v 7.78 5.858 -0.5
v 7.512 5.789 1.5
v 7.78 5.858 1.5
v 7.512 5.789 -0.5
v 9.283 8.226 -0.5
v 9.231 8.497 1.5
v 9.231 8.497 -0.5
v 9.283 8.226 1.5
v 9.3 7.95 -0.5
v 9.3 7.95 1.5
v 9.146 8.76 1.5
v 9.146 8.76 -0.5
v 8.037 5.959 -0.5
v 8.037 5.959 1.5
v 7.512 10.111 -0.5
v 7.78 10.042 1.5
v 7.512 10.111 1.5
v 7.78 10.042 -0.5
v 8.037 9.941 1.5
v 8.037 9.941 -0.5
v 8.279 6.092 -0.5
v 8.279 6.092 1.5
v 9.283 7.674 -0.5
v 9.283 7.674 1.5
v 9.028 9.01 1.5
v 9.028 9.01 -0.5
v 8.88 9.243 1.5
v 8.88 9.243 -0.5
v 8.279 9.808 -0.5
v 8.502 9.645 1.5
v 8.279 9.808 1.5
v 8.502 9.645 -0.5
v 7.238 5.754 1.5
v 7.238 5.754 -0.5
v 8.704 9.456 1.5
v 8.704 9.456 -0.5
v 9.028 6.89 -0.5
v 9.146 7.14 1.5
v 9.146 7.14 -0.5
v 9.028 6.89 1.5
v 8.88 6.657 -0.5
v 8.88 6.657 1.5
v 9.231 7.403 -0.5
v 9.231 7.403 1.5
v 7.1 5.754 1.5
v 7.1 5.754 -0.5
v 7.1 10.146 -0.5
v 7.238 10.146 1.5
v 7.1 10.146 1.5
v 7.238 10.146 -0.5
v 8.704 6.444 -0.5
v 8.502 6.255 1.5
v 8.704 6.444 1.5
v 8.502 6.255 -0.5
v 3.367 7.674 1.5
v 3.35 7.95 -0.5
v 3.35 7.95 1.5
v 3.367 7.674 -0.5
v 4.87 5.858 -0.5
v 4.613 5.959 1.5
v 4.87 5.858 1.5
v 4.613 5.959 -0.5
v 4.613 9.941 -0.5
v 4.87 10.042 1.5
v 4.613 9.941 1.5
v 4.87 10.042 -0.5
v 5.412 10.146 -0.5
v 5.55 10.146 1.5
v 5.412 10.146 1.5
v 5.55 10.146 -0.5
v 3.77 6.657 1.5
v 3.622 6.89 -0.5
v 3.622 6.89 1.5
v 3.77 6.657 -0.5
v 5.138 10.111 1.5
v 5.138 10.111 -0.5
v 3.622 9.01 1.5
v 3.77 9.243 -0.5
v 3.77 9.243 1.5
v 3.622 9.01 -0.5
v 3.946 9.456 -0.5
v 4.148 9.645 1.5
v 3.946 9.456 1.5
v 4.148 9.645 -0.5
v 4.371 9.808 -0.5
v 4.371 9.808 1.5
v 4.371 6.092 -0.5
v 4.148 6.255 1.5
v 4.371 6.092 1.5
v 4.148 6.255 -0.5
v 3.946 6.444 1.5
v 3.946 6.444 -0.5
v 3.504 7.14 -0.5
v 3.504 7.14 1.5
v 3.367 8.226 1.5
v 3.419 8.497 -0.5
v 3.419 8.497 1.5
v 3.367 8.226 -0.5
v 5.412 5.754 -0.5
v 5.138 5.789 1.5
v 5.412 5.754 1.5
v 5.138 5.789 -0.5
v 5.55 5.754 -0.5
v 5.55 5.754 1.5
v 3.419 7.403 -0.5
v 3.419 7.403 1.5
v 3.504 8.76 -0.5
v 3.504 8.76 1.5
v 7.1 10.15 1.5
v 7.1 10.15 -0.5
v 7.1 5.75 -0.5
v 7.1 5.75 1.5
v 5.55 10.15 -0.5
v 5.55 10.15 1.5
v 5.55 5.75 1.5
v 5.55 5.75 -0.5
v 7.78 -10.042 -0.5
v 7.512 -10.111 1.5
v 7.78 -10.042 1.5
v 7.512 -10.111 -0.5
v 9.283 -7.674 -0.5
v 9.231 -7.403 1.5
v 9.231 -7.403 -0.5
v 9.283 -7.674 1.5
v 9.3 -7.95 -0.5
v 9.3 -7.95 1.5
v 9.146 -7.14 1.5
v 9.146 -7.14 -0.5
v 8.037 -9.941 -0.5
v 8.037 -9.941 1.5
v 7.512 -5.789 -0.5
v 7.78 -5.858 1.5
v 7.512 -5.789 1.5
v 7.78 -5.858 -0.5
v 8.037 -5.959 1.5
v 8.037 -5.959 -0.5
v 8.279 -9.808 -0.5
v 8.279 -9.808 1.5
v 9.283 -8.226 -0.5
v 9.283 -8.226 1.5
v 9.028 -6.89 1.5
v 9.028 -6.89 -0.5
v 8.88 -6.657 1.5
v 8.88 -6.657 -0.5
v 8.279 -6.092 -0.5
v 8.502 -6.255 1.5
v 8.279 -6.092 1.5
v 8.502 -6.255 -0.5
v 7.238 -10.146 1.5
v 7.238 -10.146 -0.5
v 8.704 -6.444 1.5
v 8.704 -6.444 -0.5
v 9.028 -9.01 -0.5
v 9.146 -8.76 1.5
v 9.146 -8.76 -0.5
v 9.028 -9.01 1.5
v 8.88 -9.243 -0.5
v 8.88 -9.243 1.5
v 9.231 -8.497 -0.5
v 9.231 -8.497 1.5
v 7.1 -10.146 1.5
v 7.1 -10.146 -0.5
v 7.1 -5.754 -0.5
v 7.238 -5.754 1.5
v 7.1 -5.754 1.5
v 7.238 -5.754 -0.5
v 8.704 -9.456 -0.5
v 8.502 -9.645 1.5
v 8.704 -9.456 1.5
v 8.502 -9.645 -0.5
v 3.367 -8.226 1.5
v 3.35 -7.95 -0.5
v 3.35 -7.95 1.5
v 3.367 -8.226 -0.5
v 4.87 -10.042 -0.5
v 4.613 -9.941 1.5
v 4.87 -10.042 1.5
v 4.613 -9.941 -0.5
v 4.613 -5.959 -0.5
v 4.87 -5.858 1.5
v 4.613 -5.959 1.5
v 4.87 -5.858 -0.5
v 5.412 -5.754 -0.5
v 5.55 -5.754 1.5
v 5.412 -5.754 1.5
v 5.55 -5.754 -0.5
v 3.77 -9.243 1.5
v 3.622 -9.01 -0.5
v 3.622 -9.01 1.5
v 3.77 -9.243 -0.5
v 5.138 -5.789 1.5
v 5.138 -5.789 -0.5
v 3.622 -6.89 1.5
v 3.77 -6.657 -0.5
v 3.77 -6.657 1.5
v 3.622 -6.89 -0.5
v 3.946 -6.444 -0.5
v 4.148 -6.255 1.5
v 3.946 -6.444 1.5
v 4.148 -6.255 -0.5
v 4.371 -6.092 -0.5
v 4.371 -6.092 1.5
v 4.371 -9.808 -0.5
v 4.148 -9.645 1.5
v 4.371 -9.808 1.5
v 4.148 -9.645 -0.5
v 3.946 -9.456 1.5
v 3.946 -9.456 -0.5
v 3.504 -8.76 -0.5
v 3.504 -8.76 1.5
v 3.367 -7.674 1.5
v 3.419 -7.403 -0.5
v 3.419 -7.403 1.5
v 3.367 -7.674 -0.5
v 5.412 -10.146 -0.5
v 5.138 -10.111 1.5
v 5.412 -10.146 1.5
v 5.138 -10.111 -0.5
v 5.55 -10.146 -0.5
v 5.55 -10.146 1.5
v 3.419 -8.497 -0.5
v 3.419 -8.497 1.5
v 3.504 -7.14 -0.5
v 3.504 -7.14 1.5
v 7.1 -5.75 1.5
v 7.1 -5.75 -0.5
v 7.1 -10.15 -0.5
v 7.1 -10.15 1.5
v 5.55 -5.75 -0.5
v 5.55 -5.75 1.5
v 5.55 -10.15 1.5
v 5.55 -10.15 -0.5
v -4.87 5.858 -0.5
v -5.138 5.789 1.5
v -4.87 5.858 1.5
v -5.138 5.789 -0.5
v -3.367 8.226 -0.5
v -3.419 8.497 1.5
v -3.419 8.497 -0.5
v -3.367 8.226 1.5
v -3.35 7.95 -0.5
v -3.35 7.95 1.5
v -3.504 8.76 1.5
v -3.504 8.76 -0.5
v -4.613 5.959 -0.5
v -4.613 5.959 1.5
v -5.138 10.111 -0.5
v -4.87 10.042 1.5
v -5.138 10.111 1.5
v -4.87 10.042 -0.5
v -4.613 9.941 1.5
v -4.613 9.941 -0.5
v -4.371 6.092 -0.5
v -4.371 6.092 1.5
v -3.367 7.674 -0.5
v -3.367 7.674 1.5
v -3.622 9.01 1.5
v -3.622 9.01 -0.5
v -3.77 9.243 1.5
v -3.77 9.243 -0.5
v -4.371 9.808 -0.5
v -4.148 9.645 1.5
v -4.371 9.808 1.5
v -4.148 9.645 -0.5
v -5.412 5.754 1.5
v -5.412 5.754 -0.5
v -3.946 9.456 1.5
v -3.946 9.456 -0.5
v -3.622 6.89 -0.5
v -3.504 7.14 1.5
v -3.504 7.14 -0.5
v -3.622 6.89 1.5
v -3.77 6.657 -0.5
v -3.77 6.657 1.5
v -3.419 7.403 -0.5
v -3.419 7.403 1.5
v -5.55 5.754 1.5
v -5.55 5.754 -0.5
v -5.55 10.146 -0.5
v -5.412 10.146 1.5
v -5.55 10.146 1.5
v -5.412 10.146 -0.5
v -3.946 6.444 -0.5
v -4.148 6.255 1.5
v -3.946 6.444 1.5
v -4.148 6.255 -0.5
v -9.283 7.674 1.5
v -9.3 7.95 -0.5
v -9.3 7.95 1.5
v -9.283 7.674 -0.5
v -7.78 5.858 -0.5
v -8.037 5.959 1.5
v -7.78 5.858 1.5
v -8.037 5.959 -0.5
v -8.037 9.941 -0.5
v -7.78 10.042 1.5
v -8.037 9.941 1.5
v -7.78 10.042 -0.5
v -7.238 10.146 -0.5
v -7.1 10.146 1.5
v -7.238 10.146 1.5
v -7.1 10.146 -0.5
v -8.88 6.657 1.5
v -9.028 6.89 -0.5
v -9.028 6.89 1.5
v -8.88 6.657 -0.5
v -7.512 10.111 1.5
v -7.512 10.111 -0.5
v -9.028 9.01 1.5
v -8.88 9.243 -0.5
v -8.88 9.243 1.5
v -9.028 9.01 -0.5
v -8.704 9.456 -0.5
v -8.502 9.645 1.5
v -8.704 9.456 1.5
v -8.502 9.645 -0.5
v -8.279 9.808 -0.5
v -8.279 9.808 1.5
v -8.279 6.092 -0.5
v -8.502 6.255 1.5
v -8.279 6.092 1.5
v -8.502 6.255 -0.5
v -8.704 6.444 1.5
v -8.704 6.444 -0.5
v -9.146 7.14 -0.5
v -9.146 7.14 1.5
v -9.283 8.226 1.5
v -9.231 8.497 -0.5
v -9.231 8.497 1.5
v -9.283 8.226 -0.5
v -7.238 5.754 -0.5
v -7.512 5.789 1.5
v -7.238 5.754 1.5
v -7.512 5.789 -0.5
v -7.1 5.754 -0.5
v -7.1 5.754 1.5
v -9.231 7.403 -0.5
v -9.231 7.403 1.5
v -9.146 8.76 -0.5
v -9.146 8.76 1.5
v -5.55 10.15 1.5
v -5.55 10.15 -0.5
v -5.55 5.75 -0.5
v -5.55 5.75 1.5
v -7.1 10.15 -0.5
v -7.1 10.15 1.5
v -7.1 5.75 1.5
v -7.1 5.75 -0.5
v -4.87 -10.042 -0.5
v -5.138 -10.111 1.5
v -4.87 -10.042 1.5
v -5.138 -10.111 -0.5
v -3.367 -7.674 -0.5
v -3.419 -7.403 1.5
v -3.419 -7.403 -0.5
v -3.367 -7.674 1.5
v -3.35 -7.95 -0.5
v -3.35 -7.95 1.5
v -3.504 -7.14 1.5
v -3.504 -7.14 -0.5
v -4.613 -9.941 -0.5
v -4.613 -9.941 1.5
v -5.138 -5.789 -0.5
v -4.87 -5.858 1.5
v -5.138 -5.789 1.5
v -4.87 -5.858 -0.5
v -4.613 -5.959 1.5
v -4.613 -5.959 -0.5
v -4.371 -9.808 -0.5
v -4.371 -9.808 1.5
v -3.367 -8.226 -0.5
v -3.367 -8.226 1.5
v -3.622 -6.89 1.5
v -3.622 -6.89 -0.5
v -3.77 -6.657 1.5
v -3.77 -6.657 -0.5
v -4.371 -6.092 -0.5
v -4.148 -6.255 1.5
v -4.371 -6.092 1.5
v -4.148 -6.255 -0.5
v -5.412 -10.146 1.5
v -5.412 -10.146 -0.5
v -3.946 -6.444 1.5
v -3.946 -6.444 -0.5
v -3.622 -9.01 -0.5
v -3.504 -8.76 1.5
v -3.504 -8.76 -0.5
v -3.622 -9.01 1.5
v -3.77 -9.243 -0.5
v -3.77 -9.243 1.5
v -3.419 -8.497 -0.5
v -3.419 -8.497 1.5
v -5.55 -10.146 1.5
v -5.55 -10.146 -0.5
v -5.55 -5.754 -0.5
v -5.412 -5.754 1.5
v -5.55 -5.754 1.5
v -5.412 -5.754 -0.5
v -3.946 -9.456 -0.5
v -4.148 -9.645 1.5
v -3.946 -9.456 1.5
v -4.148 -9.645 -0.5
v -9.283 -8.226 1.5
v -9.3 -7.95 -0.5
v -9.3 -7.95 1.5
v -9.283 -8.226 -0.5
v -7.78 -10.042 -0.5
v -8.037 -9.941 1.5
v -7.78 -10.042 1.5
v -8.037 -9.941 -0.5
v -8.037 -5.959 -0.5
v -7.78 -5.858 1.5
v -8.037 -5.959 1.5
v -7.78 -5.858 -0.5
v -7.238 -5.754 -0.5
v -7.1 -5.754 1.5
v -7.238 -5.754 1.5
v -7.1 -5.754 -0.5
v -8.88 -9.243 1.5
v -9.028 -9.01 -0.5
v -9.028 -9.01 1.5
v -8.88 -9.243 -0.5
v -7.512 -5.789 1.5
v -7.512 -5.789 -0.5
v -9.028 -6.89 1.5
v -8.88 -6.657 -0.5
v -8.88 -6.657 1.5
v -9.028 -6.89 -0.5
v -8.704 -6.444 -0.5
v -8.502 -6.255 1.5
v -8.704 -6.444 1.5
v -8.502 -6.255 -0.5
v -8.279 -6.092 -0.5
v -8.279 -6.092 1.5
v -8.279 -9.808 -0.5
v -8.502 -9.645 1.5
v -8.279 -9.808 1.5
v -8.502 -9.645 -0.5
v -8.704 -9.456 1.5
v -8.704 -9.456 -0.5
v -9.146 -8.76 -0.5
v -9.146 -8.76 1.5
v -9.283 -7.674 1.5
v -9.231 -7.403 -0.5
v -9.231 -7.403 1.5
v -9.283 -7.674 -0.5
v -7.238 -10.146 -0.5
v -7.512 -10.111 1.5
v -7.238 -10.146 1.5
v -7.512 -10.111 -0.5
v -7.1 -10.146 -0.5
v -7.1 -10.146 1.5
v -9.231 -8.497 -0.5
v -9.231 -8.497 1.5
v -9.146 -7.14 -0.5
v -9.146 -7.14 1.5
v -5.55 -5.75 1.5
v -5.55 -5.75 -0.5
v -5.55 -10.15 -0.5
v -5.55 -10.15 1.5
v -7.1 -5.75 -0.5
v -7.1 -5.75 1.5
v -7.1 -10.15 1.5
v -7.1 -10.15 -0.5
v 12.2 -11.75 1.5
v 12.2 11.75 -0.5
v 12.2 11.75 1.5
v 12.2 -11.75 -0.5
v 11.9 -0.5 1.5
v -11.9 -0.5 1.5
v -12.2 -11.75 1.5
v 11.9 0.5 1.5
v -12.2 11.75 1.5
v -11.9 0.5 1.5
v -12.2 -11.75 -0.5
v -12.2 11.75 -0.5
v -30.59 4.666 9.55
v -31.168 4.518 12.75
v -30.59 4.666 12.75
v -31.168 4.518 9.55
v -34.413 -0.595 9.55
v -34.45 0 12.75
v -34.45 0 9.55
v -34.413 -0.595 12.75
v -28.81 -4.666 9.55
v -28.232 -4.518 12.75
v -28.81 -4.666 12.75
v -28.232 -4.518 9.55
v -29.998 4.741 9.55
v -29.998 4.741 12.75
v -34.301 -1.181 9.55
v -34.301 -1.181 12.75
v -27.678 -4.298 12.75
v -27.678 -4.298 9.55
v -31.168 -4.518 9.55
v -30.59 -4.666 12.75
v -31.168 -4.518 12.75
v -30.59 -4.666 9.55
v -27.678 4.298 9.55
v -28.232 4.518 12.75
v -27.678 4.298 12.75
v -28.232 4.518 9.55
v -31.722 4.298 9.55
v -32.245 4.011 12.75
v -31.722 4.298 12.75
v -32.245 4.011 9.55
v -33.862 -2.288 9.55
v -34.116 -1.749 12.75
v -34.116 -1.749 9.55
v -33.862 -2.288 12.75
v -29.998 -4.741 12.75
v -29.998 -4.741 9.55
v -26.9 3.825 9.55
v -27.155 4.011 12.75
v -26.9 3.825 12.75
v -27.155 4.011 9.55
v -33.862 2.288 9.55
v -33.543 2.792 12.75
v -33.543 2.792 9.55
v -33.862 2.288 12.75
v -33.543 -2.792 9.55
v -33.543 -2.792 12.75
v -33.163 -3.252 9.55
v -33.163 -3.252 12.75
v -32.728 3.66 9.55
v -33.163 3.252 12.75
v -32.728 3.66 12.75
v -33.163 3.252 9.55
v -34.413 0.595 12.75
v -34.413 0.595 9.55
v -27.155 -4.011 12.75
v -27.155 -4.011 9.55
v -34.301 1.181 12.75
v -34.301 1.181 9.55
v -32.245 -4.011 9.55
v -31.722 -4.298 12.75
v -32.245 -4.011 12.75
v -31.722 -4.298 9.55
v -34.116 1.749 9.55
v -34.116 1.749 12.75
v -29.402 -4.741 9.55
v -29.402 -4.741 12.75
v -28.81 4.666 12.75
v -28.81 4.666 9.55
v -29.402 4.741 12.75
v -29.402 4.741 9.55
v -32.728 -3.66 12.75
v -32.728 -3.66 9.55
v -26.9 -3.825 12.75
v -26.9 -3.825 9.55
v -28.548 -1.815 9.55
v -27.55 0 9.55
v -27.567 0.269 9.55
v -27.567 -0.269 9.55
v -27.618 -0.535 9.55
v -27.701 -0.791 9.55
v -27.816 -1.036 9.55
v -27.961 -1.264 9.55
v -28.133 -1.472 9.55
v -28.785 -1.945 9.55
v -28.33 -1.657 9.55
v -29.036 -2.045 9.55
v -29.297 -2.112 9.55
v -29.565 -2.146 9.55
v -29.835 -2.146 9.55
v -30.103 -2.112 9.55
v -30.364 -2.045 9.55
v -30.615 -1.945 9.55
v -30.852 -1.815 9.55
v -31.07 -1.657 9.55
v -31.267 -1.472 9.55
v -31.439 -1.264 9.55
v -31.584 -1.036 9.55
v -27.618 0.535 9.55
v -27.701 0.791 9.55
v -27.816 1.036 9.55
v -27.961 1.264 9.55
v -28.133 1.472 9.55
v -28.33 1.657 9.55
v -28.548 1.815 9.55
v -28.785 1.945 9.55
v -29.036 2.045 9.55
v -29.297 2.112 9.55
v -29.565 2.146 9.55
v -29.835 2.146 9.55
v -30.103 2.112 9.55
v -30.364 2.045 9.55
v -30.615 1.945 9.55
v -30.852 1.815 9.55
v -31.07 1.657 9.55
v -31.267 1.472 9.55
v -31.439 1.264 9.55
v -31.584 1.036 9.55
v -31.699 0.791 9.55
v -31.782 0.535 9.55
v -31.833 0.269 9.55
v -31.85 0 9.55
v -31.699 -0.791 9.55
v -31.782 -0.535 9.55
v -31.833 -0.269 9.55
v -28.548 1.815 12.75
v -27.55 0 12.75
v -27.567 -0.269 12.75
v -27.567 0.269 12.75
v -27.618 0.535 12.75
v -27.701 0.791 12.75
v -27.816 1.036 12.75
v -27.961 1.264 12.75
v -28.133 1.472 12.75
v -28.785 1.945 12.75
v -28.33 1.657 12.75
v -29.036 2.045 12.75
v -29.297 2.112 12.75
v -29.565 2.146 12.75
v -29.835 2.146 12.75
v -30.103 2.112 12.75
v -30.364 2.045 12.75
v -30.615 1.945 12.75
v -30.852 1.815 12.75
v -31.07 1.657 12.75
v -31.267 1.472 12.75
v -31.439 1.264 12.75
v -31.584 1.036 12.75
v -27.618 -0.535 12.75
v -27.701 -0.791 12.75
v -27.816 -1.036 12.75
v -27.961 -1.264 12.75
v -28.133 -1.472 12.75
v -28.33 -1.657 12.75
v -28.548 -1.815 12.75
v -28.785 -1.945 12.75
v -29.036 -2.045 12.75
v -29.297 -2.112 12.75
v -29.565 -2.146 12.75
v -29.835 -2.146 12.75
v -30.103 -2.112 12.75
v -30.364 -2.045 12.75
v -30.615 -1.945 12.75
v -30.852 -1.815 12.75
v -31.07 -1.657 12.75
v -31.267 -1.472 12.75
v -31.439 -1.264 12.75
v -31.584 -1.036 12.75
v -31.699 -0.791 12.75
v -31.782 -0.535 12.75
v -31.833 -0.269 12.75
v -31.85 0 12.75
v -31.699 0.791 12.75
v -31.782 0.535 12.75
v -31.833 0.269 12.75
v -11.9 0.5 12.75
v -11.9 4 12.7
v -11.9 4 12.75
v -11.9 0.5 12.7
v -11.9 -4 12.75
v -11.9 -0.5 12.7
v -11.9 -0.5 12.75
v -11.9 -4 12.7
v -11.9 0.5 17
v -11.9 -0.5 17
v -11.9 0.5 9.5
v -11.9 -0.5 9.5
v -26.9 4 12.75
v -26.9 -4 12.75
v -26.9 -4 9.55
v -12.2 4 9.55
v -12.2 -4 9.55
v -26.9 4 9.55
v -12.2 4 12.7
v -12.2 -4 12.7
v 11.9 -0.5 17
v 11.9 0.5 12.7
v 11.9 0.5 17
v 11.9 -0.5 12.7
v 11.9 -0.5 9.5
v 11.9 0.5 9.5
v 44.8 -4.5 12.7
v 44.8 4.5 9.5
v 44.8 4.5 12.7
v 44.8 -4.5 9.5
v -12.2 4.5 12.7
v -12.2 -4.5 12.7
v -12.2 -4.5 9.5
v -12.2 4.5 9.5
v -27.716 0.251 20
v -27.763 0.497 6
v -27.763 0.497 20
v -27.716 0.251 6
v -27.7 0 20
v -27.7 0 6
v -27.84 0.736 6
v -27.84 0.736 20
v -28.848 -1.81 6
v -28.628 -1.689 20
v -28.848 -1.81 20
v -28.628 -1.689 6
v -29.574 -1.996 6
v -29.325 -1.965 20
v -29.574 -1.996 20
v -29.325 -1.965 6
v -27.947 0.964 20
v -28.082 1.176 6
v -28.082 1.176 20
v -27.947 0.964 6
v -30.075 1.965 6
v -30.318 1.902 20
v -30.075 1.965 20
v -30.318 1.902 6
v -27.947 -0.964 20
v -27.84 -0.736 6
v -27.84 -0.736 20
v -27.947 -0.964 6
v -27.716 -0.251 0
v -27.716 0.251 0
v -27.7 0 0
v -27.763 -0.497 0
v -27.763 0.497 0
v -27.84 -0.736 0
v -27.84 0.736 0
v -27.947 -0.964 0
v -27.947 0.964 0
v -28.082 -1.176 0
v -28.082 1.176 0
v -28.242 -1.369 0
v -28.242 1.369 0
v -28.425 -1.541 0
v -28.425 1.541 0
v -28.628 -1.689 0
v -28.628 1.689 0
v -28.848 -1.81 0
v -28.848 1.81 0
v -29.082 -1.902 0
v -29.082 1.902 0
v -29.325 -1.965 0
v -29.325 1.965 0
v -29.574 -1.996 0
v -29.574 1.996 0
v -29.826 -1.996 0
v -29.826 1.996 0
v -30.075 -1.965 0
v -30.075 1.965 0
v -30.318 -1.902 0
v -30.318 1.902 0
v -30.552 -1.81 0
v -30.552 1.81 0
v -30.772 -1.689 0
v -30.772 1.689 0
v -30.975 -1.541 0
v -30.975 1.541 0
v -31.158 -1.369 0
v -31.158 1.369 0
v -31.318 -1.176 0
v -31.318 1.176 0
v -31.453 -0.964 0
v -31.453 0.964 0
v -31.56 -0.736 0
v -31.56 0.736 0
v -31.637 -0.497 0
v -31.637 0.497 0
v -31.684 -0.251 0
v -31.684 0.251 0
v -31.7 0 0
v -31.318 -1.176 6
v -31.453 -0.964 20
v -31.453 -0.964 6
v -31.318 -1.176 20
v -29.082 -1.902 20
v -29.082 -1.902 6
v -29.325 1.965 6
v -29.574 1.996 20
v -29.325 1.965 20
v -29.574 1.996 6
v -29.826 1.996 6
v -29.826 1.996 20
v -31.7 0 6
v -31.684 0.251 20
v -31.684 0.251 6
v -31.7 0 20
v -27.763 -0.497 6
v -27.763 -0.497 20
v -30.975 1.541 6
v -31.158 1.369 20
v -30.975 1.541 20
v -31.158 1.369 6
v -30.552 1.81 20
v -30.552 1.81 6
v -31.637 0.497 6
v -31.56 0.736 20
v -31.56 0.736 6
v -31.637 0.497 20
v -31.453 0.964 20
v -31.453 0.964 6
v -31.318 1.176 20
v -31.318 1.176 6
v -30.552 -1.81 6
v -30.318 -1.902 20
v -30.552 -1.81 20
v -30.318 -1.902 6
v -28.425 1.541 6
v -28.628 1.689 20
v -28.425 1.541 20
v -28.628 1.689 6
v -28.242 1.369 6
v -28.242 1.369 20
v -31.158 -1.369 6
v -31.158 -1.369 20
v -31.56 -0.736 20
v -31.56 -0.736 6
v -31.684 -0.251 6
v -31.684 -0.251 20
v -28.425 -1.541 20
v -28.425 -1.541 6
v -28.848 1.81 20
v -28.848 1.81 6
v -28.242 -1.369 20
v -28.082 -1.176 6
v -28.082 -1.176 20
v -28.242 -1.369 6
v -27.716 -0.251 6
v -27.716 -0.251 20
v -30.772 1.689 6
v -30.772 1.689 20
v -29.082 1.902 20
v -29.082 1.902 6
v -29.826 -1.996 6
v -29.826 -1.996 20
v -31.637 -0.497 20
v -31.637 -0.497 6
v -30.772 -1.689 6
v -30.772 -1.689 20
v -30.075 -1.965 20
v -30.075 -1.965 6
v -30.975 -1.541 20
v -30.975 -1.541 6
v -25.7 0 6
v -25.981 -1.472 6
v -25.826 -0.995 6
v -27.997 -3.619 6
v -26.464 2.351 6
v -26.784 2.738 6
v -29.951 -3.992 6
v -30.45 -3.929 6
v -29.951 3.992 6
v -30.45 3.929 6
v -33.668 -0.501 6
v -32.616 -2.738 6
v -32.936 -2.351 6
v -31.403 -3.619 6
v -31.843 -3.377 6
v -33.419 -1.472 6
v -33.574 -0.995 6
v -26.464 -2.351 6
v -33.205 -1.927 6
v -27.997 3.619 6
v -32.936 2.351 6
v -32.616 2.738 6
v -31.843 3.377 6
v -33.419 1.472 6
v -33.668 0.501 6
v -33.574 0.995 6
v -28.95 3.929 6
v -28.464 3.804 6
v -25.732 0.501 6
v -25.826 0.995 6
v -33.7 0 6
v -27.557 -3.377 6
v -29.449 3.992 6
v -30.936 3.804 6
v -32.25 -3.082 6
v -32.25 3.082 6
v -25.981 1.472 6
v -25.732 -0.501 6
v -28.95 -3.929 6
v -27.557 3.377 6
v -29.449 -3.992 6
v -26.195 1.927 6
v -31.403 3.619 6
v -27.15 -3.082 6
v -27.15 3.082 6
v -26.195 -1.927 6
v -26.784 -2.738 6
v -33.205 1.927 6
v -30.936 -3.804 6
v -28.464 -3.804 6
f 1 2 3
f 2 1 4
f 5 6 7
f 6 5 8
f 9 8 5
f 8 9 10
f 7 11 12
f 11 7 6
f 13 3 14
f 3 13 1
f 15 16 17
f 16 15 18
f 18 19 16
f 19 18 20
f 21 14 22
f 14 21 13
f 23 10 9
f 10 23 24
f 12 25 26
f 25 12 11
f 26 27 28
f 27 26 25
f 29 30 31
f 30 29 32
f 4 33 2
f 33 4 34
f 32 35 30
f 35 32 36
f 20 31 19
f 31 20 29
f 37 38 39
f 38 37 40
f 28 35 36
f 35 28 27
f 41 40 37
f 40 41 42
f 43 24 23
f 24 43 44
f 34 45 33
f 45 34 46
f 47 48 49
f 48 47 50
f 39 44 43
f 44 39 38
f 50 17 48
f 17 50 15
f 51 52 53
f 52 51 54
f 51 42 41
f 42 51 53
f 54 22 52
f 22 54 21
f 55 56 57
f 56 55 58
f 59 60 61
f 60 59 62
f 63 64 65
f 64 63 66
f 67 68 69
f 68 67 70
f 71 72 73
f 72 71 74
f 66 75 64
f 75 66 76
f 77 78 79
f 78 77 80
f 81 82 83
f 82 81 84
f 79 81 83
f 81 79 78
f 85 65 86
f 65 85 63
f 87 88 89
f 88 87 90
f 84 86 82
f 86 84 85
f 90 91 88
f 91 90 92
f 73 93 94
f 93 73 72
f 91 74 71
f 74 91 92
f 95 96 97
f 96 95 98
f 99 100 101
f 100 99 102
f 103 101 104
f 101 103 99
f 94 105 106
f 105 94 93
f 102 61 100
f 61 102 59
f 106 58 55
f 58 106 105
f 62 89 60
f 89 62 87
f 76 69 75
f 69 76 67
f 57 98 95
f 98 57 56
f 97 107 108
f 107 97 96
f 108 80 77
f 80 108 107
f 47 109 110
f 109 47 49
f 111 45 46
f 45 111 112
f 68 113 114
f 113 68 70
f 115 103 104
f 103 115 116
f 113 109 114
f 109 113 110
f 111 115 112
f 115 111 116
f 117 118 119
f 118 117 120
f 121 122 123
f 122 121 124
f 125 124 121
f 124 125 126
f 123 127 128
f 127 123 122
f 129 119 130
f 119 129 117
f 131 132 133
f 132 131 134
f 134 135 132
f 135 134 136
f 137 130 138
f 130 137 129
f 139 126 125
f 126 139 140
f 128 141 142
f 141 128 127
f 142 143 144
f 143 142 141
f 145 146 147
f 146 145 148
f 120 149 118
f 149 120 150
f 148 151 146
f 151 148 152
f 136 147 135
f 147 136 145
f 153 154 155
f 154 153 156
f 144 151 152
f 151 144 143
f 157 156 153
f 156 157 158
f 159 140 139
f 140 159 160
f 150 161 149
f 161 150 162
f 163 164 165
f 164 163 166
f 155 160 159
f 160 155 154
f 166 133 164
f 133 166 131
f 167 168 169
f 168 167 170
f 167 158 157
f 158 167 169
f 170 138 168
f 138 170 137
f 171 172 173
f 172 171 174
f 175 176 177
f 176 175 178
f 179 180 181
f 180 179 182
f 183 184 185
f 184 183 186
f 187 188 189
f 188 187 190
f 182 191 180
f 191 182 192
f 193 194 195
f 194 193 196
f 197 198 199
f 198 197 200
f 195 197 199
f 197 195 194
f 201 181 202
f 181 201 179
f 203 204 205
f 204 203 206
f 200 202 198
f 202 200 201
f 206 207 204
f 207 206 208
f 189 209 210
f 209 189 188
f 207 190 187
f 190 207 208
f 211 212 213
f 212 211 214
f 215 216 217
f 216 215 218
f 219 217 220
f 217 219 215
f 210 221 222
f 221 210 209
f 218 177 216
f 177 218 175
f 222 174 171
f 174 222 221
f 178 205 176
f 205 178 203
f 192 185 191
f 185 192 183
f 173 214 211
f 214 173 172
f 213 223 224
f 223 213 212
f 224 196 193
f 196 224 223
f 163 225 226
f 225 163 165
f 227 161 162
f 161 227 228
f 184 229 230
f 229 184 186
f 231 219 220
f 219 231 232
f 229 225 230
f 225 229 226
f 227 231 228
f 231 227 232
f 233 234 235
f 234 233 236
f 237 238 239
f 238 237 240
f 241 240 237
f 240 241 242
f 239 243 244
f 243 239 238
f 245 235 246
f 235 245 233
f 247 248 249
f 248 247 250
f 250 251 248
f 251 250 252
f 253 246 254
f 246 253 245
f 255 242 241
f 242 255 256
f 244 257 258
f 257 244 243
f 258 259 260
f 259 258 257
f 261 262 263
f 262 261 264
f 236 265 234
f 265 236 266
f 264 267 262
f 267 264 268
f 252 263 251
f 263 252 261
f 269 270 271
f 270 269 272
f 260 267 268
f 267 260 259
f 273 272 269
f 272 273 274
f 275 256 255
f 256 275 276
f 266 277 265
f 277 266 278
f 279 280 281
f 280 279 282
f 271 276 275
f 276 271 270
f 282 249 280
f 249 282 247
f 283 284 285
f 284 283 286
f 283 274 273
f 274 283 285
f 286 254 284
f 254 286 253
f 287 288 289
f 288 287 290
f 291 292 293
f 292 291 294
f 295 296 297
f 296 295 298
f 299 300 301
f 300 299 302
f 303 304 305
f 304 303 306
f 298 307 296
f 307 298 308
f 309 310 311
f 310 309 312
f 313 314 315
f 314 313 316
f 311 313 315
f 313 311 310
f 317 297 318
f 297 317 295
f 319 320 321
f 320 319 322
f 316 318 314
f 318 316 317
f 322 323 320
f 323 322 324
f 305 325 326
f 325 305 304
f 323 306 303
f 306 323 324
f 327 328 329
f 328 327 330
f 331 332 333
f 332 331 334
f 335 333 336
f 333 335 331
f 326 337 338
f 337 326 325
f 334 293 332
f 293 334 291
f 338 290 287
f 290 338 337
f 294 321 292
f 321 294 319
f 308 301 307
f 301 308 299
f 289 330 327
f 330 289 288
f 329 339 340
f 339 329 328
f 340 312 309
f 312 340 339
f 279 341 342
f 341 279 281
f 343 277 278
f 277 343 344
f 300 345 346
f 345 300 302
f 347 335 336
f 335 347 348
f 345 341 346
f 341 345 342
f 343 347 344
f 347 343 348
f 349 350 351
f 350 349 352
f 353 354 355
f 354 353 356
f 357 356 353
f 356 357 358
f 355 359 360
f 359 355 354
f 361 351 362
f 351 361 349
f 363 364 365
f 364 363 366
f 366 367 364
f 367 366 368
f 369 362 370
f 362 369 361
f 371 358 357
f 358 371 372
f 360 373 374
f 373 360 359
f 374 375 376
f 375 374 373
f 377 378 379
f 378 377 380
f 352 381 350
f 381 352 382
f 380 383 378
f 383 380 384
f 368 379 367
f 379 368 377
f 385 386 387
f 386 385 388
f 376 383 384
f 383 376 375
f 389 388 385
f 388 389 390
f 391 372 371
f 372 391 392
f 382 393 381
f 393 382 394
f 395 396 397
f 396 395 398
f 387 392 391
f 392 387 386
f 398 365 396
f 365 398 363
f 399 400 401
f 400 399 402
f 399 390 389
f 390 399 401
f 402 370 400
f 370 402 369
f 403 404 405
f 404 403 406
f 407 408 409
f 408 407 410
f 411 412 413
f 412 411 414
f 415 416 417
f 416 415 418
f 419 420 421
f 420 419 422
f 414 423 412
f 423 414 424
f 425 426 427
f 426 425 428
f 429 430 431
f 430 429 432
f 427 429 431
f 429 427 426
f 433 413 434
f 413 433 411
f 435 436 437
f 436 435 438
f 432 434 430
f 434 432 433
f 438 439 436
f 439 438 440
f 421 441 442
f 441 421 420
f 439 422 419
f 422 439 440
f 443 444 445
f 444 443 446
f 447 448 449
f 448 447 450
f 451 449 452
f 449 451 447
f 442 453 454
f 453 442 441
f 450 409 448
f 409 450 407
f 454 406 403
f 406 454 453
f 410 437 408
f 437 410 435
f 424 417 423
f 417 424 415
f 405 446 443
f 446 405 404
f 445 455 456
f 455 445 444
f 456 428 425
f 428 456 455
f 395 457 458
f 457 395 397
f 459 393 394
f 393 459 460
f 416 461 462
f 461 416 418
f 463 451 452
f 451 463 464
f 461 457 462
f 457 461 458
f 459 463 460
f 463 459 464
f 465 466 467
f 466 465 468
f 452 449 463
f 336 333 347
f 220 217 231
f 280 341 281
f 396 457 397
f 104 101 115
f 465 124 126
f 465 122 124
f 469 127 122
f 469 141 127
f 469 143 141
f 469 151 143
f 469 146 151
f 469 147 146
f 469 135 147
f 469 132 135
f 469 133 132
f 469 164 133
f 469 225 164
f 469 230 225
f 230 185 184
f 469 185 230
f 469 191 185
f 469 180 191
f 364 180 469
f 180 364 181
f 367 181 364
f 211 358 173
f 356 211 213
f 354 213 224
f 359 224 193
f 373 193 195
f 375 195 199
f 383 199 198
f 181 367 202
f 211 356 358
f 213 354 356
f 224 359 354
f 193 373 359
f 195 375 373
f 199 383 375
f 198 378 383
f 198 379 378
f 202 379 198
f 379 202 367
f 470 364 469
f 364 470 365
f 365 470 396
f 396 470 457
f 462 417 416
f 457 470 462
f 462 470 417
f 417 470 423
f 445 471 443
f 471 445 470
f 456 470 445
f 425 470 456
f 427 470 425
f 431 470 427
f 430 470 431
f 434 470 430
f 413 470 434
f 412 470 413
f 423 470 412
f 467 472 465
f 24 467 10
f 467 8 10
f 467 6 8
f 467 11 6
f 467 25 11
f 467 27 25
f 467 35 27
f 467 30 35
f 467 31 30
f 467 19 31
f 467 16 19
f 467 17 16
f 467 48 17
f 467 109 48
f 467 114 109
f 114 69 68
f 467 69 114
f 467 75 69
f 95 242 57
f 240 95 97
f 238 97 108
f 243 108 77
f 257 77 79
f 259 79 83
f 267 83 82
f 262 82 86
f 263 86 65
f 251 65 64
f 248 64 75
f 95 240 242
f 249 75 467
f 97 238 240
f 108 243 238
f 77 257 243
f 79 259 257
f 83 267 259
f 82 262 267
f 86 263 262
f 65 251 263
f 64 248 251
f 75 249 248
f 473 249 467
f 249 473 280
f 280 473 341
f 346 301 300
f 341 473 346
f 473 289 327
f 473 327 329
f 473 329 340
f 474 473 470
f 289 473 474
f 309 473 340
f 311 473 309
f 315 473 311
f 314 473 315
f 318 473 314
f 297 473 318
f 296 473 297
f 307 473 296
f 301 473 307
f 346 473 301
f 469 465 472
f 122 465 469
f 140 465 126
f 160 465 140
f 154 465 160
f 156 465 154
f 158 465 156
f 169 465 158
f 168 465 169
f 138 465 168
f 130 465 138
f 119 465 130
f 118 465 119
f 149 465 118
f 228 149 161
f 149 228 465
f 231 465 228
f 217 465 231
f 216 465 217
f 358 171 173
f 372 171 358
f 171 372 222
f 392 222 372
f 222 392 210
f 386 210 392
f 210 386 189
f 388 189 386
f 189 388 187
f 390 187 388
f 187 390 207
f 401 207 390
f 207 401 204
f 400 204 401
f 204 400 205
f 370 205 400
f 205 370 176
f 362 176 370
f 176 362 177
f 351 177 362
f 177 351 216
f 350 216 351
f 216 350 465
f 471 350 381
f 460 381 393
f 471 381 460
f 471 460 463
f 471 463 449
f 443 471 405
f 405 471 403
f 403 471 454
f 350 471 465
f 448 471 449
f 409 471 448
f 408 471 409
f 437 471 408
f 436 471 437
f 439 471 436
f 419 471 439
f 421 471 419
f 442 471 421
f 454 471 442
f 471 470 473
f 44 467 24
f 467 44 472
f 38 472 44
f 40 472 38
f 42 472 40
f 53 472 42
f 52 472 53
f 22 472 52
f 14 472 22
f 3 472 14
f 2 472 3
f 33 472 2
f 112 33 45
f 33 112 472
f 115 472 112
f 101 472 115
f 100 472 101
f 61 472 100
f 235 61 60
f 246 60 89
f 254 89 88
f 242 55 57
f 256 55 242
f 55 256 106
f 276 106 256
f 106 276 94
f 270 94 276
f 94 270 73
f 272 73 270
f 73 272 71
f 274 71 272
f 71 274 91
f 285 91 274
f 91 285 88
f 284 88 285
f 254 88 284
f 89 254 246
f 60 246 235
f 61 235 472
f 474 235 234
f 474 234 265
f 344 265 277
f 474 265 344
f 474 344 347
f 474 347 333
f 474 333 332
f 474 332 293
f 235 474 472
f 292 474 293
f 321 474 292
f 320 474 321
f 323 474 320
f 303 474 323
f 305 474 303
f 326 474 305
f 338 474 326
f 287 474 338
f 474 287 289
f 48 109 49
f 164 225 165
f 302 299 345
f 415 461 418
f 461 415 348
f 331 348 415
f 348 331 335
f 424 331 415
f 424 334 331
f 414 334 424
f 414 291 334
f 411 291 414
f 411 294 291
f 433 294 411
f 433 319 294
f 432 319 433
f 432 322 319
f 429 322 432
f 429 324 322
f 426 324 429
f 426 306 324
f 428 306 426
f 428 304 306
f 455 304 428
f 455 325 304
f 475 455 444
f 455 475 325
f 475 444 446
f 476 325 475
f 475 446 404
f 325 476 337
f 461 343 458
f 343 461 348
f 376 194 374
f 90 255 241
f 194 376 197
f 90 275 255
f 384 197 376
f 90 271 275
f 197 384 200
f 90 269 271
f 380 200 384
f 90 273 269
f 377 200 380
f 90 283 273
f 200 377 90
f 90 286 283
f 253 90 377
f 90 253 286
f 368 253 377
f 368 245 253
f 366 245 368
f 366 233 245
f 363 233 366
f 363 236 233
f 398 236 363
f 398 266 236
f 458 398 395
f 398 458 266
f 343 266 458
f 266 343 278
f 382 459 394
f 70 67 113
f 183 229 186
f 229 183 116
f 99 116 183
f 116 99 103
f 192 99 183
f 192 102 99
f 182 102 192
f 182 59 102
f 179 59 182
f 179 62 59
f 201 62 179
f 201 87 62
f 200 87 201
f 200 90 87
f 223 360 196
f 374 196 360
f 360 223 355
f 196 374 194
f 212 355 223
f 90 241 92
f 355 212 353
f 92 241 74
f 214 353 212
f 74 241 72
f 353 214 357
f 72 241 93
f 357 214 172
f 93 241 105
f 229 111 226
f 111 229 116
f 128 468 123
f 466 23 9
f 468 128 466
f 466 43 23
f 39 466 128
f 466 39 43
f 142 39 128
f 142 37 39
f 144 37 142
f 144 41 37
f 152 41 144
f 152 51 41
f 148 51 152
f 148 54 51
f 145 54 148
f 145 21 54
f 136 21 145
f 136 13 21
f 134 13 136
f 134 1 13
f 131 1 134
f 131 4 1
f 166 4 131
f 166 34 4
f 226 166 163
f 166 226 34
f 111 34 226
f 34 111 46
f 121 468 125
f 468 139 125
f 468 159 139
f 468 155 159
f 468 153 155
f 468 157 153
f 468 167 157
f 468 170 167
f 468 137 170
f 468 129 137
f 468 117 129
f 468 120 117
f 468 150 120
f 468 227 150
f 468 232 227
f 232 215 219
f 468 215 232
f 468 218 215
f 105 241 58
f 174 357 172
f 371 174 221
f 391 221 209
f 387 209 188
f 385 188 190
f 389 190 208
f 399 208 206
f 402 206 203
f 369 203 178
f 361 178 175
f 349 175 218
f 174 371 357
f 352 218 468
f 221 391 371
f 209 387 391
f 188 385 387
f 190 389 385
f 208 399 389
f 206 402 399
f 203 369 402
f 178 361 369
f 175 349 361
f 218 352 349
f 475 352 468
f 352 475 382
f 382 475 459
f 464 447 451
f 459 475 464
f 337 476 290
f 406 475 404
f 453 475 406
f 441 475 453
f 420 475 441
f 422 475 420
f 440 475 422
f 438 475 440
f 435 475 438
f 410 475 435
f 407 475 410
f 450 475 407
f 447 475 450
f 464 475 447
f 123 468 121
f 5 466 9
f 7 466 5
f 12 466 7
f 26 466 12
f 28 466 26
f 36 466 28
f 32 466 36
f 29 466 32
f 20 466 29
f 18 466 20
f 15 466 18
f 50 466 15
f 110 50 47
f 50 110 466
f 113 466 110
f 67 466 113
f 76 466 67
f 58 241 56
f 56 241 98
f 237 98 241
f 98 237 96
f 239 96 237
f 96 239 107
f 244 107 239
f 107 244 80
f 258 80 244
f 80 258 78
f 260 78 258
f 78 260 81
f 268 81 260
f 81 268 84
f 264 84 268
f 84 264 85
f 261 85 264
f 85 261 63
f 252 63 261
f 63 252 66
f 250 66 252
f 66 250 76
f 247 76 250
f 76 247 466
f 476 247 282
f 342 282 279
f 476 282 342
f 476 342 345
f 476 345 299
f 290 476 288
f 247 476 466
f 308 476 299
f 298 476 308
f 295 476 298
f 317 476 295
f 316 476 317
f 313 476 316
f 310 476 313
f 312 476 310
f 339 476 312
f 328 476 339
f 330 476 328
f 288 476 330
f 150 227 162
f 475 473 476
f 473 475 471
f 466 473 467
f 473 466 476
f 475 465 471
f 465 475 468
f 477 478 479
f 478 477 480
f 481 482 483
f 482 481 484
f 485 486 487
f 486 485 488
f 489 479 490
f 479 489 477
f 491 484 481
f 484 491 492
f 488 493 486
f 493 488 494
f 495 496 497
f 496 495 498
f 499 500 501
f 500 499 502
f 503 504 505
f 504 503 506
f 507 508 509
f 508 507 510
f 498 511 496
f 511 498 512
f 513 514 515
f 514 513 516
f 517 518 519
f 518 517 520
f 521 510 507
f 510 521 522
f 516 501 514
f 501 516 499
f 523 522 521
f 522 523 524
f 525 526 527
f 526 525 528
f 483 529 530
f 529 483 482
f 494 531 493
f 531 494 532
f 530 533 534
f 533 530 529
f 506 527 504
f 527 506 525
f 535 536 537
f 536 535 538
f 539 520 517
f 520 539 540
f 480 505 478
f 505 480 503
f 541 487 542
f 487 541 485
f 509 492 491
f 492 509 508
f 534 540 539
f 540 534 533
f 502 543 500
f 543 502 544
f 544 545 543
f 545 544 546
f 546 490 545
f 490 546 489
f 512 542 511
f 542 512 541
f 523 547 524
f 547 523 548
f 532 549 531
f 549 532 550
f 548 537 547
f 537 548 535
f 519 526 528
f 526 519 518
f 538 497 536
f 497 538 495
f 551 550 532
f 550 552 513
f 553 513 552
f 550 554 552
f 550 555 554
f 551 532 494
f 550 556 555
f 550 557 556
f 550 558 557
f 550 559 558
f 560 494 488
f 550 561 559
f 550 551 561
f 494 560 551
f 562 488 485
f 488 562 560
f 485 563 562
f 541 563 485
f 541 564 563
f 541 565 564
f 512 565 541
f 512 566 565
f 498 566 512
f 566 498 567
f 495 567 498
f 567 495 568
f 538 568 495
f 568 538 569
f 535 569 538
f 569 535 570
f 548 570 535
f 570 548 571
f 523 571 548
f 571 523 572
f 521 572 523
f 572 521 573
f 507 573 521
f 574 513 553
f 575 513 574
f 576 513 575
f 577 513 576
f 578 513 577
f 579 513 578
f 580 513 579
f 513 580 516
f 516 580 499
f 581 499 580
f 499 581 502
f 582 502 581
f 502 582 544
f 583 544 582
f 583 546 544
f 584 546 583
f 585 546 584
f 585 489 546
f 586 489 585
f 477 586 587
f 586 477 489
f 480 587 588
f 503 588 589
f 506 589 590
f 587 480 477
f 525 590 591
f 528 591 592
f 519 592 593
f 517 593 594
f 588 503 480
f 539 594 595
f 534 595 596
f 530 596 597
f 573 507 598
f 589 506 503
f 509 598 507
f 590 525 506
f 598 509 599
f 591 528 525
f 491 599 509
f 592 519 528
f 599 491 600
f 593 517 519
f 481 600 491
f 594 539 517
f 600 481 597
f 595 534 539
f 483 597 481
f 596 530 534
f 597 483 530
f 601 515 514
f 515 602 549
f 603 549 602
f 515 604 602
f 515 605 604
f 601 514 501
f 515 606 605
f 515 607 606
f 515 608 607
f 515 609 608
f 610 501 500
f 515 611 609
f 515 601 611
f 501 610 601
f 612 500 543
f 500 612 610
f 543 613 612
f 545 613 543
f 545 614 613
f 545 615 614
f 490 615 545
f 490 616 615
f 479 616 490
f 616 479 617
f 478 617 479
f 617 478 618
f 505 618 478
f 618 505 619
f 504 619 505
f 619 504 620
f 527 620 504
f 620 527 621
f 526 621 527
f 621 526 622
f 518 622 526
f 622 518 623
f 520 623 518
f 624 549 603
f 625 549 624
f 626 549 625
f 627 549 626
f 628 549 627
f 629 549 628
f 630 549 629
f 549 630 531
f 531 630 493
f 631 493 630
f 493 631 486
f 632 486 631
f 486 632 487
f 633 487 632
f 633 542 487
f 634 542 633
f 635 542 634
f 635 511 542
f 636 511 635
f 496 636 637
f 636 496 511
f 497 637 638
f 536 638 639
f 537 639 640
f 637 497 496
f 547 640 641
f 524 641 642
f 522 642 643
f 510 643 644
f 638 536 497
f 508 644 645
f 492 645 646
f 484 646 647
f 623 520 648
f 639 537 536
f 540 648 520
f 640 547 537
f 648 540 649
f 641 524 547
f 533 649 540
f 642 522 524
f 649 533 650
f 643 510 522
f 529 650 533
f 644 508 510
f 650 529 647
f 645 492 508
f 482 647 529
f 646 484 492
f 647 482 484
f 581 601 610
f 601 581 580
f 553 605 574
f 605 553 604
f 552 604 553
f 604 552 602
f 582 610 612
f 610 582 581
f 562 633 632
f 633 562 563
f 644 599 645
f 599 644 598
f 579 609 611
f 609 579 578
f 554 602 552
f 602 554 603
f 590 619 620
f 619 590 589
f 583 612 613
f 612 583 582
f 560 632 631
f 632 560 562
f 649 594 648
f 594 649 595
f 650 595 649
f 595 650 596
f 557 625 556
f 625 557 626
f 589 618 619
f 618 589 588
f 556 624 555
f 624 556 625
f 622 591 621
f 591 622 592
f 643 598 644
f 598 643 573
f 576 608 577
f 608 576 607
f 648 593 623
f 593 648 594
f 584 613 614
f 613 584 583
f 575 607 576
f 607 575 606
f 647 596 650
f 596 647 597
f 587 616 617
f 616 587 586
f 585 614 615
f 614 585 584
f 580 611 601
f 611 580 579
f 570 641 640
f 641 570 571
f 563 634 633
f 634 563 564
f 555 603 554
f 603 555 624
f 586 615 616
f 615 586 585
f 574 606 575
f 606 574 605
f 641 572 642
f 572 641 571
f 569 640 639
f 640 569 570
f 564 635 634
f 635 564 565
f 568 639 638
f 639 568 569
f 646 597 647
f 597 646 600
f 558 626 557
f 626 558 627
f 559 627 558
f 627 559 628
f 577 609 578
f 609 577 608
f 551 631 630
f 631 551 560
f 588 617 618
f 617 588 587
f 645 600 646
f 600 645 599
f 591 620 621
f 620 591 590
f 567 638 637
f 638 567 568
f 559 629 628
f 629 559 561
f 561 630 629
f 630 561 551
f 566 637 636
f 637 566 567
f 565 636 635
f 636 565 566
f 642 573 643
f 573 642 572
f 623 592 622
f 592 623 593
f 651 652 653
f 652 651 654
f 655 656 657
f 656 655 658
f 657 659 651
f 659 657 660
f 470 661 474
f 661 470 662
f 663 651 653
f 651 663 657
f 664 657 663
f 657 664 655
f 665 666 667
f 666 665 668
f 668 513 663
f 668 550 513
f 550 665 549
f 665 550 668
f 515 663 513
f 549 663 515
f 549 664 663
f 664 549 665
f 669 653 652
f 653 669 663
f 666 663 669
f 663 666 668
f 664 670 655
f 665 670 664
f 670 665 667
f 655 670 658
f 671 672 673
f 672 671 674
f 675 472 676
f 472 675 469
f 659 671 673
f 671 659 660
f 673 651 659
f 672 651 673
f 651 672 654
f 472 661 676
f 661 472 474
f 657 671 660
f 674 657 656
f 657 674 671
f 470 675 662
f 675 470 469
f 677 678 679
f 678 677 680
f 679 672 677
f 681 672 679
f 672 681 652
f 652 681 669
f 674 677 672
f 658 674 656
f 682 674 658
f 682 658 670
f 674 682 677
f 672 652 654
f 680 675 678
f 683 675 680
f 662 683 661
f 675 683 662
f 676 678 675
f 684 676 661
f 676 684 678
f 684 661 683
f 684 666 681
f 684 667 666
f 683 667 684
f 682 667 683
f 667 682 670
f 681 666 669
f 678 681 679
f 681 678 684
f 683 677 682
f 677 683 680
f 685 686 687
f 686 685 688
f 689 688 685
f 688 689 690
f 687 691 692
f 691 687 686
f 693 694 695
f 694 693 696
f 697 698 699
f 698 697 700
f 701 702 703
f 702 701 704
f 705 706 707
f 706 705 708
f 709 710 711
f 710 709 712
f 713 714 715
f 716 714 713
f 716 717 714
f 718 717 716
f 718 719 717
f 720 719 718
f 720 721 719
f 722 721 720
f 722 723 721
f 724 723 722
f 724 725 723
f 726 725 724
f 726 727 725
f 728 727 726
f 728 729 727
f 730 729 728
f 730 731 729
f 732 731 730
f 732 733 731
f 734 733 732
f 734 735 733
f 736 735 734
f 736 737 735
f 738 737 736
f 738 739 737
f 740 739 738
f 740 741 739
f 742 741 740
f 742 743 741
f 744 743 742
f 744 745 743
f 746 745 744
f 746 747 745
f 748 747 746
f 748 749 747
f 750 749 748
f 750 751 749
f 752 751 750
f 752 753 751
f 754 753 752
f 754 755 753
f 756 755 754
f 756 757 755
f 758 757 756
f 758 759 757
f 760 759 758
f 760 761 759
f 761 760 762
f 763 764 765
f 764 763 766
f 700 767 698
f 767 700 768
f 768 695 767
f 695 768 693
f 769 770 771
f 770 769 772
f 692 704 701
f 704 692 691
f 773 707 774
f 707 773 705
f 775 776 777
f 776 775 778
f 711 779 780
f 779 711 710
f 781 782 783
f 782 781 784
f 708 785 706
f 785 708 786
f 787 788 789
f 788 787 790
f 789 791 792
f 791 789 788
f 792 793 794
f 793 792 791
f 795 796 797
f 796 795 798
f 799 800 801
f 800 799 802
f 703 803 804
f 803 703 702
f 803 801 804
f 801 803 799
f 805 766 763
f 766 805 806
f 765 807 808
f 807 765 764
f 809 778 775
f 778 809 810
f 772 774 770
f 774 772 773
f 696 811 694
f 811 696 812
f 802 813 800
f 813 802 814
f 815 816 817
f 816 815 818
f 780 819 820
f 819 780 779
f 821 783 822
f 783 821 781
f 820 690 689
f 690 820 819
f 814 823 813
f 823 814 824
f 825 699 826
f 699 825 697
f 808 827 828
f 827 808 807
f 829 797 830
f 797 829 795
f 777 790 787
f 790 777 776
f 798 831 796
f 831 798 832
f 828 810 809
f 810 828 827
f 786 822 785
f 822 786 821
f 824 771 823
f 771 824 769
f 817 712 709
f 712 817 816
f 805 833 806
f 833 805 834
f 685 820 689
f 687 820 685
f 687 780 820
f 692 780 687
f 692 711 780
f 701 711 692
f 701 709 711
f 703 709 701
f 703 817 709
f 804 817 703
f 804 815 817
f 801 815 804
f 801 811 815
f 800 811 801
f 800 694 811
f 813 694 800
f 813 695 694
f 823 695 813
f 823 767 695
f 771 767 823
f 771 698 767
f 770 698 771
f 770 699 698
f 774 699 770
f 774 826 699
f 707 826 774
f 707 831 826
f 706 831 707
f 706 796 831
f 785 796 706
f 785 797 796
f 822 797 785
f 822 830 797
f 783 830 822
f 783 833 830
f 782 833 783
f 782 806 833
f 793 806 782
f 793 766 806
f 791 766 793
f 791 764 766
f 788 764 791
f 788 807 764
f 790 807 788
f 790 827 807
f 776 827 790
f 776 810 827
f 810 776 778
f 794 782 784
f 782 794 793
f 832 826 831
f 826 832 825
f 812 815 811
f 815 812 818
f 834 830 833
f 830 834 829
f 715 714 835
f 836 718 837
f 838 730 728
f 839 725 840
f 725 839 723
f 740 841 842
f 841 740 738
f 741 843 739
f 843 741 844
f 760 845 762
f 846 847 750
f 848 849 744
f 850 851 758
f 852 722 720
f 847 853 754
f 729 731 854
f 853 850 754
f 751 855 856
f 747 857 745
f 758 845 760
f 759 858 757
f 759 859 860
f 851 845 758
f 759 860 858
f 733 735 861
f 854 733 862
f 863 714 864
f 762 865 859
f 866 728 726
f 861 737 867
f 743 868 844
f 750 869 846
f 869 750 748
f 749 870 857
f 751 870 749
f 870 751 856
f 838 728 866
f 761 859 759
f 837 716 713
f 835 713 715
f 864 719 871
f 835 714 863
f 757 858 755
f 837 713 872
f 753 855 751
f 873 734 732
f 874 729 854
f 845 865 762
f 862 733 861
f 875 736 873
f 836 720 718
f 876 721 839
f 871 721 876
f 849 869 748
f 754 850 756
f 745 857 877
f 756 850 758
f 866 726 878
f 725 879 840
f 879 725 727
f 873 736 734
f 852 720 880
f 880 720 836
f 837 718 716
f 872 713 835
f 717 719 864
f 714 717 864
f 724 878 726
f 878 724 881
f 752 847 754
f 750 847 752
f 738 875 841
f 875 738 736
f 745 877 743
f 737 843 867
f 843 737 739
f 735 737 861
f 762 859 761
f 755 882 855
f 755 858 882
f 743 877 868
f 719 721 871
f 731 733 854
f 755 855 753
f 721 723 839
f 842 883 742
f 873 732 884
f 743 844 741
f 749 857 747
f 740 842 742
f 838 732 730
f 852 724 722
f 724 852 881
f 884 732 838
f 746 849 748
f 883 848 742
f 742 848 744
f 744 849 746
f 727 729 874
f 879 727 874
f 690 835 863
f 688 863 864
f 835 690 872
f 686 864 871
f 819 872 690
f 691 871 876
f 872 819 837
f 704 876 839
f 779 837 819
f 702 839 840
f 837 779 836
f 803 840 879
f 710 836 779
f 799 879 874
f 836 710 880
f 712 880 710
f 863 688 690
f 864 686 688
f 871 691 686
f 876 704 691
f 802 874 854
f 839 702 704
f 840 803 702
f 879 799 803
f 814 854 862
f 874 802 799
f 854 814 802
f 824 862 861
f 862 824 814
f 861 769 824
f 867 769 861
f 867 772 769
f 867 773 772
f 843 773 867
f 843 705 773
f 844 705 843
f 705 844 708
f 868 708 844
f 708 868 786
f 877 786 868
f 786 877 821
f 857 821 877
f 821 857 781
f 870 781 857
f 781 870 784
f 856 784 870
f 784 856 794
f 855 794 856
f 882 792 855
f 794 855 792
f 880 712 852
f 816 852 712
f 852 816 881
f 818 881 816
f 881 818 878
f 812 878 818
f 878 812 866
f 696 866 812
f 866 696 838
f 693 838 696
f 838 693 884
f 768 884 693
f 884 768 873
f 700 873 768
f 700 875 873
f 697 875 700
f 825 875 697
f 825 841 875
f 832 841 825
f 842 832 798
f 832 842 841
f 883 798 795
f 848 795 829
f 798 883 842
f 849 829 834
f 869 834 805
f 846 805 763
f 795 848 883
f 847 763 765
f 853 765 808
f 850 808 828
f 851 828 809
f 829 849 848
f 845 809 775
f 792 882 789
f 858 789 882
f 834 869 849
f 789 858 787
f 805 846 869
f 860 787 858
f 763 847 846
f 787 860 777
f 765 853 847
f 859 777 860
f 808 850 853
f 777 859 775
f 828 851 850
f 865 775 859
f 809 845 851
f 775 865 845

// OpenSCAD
//centre of base plate is centre of model

function toggle_clamp_holes() = [(14.2/2-11.1/2)/2+11.1/2, 15.9/2];

module toggle_clamp()
{
	base_plate_dims = [24.4, 23.5, 2];
	hole_seperation_min = 11.1;
	hole_seperation_max = 14.2;
	hole_width = 15.9;
	hole_size = 4.4;
	
	color("Silver")
	render()
	difference()
	{
		//base plate
		translate([0,0, 1/2]) cube(size=base_plate_dims, center=true);
		
		//mounting holes
		for(i=[1,-1])
			for(j=[1,-1])
				translate([i*(hole_seperation_max/2-(hole_seperation_max-hole_seperation_min)/4), j*hole_width/2, 0])
					union()
					{
						cube(size=[(hole_seperation_max-hole_seperation_min)/2, hole_size, 5], center=true);
						for(i=[1,-1])
							translate([i*((hole_seperation_max-hole_seperation_min)/2)/2,0,0])
								cylinder(d=hole_size, h=5, $fn=50, center=true);
					}
	}
	
	//clamp end
	color("Silver")
	render()
	translate([-base_plate_dims[0]/2-17.5, 0, (3.2/2)+9.55])
		difference()
		{
			cylinder(d=9.5, h=3.2, $fn=50, center=true);
			cylinder(d=4.3, h=3.3, $fn=50, center=true);
		}
	
	color("Silver")
	render()
	translate([-23.8/2-15/2, 0, (3.2/2)+9.55]) 
		cube(size=[15,8,3.2], center=true);
	
	//central mount
	color("Silver")
	render()
	translate([0, 0, 17/2]) 
		cube(size=[23.8, 1, 17], center=true);
	
	//lever
	color("Red")
	render()
	translate([(79.25-22.25)/2-base_plate_dims[0]/2, 0, (3.2/2)+9.5])
		cube(size=[(79.25-22.25), 9, 3.2], center=true);
		
	//stopper
	color("Silver")
	render()
	translate([-17.5-(base_plate_dims[0]/2), 0, 20/2])
		cylinder(d=4, h=20, $fn=50, center=true);
	
	color("Black")
	render()
	translate([-17.5-(base_plate_dims[0]/2), 0, 6/2]) 
		cylinder(d1=4, d2=8, h=6, $fn=50, center=true);
		
	echo(str("Item: Toggle Clamp (27Kg)"));
}

toggle_clamp();
